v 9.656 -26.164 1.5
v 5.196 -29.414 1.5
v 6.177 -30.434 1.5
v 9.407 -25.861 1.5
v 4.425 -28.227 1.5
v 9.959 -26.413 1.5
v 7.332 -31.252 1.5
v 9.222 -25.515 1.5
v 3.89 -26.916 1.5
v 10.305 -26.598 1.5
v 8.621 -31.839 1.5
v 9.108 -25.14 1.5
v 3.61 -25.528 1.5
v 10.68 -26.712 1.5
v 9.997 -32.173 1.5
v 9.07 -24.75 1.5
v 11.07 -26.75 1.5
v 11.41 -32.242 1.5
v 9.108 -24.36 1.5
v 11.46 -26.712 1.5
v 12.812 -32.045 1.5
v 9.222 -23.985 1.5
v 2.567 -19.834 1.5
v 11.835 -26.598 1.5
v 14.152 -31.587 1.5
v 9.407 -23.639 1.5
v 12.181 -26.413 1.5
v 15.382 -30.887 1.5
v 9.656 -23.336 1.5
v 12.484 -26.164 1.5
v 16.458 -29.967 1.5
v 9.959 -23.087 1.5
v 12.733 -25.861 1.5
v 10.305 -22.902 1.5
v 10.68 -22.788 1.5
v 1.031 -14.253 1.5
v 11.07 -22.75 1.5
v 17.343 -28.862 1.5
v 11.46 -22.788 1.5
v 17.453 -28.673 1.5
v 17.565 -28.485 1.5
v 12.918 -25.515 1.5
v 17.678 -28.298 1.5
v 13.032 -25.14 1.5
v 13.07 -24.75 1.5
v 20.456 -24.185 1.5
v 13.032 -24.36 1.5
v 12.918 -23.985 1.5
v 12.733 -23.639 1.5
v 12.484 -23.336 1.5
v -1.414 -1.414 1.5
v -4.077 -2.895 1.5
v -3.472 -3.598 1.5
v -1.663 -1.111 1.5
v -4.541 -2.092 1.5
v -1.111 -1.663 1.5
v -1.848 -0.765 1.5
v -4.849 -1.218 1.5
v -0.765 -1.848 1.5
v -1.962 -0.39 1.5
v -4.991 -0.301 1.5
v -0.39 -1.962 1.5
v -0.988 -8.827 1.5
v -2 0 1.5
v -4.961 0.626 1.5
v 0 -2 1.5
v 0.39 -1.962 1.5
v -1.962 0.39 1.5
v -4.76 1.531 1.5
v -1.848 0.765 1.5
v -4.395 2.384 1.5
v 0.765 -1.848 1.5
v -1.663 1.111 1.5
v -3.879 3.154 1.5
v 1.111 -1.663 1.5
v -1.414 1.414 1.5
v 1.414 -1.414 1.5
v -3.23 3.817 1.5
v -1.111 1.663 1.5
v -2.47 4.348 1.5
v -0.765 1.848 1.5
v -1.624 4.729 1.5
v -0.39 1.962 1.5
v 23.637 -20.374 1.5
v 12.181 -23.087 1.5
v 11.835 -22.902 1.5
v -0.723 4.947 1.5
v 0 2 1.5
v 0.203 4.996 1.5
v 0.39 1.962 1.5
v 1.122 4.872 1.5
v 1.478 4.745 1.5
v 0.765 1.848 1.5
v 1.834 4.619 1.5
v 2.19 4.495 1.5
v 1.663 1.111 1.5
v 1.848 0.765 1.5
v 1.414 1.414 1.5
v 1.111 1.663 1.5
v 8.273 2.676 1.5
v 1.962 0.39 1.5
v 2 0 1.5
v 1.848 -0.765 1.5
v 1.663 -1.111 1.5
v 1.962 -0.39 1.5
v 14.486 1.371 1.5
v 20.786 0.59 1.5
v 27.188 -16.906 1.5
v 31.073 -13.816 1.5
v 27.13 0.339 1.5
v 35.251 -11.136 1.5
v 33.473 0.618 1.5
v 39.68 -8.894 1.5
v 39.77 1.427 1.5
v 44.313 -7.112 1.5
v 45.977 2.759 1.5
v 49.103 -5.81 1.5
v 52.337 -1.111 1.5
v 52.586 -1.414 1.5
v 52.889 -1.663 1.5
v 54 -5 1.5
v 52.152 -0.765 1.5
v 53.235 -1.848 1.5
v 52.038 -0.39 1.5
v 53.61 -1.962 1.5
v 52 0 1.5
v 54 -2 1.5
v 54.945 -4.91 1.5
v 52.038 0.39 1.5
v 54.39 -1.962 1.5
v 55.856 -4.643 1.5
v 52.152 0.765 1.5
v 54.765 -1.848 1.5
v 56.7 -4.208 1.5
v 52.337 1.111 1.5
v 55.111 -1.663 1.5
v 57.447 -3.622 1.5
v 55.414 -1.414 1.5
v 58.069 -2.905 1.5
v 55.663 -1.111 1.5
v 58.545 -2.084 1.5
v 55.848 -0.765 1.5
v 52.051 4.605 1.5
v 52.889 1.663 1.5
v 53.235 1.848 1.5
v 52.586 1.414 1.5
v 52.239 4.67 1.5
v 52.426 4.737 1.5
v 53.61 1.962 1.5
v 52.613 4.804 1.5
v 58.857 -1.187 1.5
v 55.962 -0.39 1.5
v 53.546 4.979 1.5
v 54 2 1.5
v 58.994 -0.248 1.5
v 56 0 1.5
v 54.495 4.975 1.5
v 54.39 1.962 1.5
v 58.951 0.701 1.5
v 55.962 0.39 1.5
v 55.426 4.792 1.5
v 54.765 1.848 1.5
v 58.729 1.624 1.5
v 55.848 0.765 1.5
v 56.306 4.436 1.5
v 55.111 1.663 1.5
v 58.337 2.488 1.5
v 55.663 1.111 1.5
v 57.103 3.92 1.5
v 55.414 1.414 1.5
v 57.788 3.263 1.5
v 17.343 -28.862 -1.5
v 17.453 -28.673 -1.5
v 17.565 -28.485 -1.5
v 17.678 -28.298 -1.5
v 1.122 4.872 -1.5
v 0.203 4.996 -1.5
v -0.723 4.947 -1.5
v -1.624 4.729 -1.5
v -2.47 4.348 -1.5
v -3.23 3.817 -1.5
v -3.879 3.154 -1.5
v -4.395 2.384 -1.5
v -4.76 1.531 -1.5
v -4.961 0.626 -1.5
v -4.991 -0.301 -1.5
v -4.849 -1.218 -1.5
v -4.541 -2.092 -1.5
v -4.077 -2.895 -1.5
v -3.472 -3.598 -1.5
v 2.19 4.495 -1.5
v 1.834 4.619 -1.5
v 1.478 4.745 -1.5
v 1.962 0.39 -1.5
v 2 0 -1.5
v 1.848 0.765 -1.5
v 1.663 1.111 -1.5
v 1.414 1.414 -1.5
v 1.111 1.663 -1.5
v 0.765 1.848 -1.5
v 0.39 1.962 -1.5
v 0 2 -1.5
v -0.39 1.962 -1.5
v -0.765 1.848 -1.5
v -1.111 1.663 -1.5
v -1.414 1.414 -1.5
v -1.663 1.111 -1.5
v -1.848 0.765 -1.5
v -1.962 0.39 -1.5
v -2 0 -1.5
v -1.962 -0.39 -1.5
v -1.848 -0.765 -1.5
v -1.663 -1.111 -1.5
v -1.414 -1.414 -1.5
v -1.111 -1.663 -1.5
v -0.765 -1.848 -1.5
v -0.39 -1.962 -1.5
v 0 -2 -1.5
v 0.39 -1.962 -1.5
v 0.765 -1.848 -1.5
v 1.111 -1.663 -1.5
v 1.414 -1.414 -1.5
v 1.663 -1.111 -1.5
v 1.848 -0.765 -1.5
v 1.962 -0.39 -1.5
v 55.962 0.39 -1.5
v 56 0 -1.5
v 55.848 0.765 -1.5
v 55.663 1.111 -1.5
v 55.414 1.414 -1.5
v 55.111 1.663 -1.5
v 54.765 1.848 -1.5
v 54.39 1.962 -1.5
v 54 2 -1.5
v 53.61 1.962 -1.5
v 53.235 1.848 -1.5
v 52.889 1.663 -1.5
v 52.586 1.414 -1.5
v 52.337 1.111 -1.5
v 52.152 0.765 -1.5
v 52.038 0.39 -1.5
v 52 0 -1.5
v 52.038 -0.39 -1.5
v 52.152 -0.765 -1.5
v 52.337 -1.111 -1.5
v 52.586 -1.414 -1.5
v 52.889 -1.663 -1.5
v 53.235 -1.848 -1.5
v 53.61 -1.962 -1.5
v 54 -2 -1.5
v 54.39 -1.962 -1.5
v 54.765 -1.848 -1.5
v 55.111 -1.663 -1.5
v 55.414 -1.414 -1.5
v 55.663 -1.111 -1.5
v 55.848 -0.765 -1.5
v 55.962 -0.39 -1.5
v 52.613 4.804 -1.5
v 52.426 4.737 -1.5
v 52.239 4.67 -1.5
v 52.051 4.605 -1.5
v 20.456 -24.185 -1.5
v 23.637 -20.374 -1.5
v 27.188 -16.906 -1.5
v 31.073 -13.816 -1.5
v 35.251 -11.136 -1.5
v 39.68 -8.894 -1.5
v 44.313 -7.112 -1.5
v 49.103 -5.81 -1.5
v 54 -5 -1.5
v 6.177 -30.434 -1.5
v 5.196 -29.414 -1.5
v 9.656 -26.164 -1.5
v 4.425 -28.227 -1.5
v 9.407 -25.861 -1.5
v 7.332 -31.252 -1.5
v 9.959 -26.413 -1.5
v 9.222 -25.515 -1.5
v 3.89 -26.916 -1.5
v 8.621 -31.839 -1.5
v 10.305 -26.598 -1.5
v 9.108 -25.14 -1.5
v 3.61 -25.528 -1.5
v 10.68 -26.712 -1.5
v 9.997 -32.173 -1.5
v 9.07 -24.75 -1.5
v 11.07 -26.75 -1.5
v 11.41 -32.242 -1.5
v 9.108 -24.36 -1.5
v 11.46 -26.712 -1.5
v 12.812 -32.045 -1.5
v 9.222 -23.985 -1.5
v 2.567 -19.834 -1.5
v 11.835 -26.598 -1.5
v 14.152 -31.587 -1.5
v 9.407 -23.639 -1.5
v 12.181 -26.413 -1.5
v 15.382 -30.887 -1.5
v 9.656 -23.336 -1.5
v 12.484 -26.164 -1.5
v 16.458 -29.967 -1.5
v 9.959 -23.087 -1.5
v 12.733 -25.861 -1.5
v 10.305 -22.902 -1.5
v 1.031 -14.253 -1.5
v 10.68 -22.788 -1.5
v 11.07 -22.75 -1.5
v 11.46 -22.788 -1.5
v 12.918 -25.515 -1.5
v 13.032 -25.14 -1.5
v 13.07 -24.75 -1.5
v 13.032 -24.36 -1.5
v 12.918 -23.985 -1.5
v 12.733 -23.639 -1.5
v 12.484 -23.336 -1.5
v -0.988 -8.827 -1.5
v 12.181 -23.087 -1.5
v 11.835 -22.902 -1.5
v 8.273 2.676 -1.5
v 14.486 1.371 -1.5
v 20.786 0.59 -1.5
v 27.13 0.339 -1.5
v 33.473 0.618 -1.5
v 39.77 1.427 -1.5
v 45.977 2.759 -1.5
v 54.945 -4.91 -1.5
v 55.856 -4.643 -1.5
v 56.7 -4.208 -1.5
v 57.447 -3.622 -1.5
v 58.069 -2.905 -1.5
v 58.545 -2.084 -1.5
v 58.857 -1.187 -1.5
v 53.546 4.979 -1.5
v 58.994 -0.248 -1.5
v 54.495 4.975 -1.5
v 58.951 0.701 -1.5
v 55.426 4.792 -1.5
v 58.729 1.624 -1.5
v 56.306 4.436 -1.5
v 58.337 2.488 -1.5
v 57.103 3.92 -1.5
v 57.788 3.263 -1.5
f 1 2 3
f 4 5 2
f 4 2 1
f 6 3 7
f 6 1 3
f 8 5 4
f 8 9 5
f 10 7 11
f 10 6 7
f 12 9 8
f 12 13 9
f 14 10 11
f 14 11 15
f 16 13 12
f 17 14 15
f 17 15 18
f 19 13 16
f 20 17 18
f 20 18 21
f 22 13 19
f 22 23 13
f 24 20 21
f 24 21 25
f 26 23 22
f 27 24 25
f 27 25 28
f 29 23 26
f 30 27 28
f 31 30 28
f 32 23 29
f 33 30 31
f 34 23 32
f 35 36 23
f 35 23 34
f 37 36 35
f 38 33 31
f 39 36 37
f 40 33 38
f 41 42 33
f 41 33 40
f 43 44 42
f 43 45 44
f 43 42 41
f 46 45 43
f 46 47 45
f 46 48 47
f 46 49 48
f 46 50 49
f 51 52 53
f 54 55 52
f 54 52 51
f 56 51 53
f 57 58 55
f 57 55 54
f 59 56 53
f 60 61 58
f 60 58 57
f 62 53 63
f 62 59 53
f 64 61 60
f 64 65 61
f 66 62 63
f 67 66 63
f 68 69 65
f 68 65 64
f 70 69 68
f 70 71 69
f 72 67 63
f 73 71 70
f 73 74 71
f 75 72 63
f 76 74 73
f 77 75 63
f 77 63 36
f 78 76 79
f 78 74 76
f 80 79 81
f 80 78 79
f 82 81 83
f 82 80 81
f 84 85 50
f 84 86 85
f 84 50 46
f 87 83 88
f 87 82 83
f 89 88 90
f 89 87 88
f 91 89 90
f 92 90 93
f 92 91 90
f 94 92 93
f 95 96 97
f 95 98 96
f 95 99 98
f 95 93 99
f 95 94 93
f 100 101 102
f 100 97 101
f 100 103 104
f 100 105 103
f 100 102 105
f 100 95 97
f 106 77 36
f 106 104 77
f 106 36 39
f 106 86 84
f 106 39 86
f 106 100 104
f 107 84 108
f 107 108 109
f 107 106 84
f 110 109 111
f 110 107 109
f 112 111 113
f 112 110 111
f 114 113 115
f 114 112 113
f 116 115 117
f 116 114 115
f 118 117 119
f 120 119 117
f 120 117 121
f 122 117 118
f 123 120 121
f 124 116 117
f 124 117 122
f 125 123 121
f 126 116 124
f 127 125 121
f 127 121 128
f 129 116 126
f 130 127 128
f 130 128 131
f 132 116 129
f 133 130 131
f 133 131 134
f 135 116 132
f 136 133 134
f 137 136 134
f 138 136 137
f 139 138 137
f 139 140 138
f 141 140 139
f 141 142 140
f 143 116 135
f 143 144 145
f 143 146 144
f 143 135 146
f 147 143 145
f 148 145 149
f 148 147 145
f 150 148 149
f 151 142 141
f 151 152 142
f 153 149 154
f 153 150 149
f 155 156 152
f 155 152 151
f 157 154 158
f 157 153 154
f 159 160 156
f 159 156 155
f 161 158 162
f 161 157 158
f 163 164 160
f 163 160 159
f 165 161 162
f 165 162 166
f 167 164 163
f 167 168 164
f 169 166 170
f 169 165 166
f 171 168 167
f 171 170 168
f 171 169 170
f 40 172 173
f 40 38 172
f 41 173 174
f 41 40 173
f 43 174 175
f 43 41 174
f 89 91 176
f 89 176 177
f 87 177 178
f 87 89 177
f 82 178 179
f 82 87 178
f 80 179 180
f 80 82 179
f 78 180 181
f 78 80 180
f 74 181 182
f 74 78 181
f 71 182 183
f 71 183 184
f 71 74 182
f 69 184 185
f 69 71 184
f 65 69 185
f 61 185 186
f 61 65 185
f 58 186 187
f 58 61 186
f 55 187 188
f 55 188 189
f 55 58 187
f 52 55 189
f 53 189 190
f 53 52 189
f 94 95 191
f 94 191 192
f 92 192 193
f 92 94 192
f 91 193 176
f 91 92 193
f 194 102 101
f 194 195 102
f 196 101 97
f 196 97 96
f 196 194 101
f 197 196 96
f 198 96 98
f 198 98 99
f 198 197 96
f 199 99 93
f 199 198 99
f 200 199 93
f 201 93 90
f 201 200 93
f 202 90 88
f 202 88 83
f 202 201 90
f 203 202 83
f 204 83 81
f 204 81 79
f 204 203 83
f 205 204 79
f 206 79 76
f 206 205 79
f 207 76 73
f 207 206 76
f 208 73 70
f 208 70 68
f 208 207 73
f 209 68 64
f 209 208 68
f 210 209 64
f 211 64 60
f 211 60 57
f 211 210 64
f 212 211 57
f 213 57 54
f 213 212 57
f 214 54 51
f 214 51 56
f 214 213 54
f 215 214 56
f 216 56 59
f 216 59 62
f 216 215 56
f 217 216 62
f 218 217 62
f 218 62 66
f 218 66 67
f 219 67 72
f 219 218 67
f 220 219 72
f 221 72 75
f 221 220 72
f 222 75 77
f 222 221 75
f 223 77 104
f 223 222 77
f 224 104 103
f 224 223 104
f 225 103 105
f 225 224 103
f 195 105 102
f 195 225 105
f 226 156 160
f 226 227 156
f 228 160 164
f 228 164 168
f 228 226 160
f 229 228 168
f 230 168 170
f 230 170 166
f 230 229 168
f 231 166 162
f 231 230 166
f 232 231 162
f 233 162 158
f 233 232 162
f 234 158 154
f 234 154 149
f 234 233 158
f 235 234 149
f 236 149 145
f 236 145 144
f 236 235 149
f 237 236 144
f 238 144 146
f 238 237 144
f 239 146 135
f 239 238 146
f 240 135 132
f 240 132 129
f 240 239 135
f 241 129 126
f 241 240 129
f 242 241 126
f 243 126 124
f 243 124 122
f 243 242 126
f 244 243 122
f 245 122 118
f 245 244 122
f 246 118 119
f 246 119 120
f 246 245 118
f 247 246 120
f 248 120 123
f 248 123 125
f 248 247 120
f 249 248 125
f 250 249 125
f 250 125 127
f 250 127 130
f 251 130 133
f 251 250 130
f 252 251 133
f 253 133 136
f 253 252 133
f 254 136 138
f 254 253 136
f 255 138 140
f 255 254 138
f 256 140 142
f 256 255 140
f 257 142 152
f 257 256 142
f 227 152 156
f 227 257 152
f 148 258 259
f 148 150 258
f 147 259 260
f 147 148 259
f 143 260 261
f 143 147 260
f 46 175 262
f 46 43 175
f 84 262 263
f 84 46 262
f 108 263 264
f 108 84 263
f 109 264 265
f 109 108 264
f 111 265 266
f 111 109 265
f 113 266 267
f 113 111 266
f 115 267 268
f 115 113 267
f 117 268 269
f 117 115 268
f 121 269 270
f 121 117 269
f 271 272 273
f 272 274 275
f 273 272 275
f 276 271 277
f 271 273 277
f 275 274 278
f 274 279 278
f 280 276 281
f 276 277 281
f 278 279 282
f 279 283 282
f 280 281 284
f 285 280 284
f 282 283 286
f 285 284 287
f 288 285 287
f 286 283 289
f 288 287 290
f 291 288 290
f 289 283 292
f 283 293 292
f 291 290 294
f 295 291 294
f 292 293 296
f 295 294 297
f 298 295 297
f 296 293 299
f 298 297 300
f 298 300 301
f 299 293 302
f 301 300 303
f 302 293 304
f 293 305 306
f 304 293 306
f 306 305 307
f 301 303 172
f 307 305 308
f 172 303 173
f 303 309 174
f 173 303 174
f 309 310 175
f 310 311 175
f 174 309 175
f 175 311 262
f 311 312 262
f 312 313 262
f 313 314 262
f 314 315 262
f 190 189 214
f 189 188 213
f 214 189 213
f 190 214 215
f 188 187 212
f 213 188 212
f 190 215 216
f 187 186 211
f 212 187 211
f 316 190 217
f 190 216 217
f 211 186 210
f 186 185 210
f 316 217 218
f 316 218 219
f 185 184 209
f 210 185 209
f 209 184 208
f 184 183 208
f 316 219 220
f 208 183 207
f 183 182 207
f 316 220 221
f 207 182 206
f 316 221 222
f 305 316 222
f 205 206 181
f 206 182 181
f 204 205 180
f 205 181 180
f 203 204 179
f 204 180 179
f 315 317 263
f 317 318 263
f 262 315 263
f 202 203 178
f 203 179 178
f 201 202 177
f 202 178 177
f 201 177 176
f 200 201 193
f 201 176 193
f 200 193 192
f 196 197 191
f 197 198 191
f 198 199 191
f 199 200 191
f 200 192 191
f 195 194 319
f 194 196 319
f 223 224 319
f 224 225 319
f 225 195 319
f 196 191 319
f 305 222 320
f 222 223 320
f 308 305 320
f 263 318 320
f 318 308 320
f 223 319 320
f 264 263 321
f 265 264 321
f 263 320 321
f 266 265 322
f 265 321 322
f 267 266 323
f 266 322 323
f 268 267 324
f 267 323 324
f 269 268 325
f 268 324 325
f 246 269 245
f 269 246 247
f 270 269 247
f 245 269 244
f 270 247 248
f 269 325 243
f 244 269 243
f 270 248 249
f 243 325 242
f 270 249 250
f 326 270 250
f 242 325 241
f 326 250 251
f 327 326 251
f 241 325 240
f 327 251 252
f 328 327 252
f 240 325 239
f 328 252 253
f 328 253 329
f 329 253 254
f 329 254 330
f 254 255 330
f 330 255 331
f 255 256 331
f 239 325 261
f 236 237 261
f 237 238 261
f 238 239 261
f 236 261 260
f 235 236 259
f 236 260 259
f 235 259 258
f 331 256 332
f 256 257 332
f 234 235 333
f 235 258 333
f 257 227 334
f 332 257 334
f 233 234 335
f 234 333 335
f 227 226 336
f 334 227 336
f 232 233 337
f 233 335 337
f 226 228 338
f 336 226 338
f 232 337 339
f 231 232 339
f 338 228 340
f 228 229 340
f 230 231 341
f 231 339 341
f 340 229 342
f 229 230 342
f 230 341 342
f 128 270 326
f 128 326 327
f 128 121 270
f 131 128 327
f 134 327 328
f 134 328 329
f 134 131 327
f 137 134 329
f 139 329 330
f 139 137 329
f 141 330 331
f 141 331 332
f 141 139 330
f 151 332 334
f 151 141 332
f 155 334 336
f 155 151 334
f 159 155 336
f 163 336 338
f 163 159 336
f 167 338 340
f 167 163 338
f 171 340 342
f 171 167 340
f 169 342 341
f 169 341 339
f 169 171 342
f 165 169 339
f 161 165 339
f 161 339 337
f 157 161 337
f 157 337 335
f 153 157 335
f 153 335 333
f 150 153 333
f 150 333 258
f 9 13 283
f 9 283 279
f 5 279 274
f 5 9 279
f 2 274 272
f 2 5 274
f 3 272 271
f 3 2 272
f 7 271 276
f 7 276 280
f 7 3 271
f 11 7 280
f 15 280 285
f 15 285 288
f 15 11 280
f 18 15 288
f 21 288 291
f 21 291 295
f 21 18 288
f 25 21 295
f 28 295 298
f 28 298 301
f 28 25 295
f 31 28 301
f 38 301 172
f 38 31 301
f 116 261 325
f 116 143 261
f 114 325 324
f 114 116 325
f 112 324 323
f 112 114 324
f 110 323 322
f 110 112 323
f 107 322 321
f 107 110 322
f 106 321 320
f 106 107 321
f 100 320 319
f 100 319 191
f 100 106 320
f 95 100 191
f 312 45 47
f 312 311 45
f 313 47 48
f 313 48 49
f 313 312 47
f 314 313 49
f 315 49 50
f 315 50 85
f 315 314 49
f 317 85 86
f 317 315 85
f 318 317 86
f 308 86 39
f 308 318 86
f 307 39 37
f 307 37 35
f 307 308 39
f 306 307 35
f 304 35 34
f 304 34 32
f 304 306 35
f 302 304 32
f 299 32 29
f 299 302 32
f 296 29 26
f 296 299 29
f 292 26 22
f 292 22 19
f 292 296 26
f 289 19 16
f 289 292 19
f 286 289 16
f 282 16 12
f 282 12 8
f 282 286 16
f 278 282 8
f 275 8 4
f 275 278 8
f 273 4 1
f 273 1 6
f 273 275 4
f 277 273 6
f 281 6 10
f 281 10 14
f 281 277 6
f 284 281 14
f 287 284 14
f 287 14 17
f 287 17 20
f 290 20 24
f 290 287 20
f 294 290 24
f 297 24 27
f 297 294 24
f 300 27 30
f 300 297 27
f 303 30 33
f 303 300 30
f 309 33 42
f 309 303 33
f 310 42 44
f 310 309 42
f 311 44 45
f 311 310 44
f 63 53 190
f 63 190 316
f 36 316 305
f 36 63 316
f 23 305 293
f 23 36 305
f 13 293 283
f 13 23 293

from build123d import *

# Parameters (mm, degrees)
SKETCH_1_R      = 2
EXTRUDE_1_DEPTH = 1.5


with BuildPart() as part:
    # 草图1 → 凸台-拉伸1 (new, symmetric)
    with BuildSketch(Plane.XY):
        with BuildLine():
            ThreePointArc((52.051282327, 4.604617186), (27.130077256, 0.338946041), (2.190311245, 4.494723201))
            ThreePointArc((2.190311245, 4.494723201), (1.655516013, 4.681596435), (1.122130296, 4.872455603))
            ThreePointArc((1.122130296, 4.872455603), (-4.395154703, 2.383823638), (-3.472004537, -3.597941702))
            ThreePointArc((-3.472004537, -3.597941702), (1.030595655, -14.252623677), (3.610487783, -25.528252843))
            ThreePointArc((3.610487783, -25.528252843), (9.300815316, -32.038345872), (17.342543053, -28.861593809))
            ThreePointArc((17.342543053, -28.861593809), (17.509155318, -28.5792742), (17.677657577, -28.298078543))
            ThreePointArc((17.677657577, -28.298078543), (33.128101274, -12.422940849), (54, -5))
            ThreePointArc((54, -5), (58.950668102, 0.700632103), (52.612561199, 4.803645863))
            ThreePointArc((52.612561199, 4.803645863), (52.332116942, 4.703581101), (52.051282327, 4.604617186))
        make_face()
        with Locations((11.07, -24.75)):
            Circle(SKETCH_1_R, mode=Mode.SUBTRACT)
        Circle(SKETCH_1_R, mode=Mode.SUBTRACT)
        with Locations((54, 0)):
            Circle(SKETCH_1_R, mode=Mode.SUBTRACT)
    extrude(amount=EXTRUDE_1_DEPTH, both=True)


solid = part.part
